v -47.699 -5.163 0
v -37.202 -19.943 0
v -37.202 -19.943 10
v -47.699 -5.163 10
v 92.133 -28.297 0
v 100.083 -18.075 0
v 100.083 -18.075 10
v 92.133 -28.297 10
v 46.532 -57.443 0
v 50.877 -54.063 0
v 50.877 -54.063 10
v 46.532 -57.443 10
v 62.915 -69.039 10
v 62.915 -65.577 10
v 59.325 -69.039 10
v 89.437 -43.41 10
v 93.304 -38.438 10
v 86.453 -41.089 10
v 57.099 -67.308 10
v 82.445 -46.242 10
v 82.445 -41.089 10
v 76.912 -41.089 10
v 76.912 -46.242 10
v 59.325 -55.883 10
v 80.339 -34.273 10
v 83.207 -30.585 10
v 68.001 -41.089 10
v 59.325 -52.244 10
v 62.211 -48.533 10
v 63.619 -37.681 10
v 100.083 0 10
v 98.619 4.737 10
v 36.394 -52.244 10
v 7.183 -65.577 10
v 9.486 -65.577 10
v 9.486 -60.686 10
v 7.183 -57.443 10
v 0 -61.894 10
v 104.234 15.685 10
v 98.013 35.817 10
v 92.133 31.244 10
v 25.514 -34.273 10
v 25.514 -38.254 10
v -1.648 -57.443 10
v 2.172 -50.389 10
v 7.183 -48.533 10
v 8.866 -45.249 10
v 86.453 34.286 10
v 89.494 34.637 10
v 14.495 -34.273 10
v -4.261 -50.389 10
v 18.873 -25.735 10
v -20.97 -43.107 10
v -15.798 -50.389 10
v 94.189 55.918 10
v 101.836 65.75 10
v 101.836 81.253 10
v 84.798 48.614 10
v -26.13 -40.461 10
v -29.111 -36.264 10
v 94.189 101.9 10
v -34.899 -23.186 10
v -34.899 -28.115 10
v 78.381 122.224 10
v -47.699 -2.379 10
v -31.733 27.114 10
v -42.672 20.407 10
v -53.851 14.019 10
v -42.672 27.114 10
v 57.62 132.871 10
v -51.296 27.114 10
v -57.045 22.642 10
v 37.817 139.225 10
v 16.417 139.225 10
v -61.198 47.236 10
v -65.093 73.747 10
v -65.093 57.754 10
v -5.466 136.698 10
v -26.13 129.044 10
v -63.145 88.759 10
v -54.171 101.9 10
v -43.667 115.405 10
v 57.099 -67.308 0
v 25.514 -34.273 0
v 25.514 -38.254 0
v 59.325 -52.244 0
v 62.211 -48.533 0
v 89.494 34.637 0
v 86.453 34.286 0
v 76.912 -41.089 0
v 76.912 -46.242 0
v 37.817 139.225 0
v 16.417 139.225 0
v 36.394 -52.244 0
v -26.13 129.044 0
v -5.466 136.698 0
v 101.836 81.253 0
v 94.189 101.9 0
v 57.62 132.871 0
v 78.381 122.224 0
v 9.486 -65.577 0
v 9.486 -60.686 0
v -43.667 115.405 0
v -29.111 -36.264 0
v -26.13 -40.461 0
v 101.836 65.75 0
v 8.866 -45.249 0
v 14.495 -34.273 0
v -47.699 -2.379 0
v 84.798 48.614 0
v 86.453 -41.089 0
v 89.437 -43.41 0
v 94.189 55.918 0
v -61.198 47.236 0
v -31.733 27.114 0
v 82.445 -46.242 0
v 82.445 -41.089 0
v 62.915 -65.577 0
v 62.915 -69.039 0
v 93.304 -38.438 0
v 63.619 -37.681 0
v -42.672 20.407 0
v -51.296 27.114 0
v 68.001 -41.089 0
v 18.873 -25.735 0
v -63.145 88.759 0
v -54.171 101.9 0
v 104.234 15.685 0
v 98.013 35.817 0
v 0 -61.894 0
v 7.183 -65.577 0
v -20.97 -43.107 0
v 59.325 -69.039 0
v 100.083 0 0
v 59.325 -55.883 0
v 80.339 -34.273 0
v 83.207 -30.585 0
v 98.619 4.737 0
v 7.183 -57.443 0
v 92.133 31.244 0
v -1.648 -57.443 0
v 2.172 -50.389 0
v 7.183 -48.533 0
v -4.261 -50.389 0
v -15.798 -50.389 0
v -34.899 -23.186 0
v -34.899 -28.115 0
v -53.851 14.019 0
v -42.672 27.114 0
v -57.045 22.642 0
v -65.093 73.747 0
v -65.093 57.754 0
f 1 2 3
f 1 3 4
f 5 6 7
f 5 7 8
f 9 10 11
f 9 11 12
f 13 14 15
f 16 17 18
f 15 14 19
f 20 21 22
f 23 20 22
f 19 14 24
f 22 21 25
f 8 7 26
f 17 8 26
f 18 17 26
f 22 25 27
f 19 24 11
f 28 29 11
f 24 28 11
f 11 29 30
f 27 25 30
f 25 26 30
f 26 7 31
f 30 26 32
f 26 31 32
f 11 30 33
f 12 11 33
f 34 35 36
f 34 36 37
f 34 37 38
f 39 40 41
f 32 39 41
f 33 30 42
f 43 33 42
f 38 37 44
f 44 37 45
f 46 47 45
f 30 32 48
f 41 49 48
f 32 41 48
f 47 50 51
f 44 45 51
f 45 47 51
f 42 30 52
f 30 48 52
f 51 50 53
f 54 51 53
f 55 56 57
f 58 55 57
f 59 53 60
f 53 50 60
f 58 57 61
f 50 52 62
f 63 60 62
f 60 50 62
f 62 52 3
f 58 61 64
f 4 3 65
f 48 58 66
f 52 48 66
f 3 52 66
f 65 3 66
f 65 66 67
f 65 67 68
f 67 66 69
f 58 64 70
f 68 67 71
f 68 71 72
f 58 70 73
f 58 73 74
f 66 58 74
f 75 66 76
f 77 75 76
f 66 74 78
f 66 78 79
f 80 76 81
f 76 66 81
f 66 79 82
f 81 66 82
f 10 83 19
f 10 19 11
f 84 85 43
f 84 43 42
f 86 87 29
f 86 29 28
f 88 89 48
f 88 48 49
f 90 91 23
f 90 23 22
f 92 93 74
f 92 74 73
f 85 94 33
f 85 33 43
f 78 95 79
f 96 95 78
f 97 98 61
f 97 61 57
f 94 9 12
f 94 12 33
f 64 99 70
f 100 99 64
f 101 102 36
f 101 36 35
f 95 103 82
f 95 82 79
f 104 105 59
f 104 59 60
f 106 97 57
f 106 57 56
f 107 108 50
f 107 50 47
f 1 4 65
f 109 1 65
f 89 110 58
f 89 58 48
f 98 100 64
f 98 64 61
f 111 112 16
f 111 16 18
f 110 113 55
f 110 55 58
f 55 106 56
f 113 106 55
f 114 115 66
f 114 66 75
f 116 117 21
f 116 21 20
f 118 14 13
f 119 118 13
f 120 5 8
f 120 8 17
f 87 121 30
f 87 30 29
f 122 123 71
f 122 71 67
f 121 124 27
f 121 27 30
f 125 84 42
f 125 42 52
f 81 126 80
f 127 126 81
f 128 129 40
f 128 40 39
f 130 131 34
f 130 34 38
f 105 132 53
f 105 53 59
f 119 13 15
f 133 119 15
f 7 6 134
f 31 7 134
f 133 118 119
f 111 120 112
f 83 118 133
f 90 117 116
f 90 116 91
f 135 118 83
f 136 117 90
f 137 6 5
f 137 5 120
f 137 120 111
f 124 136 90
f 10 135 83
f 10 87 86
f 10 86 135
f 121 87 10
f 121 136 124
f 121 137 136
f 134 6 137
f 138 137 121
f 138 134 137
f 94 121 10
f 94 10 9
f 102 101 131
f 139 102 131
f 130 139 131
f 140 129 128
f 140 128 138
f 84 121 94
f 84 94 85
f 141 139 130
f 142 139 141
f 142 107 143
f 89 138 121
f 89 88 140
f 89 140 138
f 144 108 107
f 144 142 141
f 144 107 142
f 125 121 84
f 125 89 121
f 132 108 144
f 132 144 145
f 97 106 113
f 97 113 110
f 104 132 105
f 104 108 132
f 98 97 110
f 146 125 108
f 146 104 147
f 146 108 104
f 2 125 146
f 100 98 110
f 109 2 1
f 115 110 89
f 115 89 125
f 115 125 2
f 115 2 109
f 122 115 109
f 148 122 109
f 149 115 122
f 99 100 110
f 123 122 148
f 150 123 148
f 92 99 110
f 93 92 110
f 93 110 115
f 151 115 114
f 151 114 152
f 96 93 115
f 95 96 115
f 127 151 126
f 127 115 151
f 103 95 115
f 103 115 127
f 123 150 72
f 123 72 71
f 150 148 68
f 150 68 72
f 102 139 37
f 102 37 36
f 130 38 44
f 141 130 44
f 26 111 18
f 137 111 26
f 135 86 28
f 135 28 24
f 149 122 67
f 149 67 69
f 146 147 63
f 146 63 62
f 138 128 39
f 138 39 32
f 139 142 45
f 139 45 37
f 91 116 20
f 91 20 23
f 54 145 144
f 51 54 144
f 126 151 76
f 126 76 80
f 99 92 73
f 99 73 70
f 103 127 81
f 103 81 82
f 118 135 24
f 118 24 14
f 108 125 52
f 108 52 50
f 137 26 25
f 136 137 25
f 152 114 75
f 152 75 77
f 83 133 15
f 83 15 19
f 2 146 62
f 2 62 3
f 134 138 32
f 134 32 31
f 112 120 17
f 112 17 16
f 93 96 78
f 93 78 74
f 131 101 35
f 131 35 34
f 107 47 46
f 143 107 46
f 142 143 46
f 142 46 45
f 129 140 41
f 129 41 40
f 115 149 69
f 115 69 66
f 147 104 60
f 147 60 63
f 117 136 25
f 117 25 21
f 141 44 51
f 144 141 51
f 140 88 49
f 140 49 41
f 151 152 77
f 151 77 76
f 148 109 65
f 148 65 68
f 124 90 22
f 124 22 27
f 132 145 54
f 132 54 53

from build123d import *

# Parameters (mm, degrees)
EXTRUDE_1_DEPTH = 10


with BuildPart() as part:
    # Эскиз1 → Бобышка-Вытянуть1 (new body)
    with BuildSketch(Plane.XY):
        Polygon((-53.85138596, 14.018578311), (-57.04541686, 22.64246174), (-51.296161241, 27.114105), (-42.672277811, 20.40664011), (-42.672277811, 27.114105), (-31.732721979, 27.114105), (-61.19765703, 47.236499669), (-65.092910636, 57.753684406), (-65.092910636, 73.746956137), (-63.145283833, 88.758901366), (-54.17078905, 101.900125869), (-43.667374626, 115.404515844), (-26.130435815, 129.044357141), (-5.466398977, 136.697704118), (16.417293835, 139.224589583), (37.817300864, 139.224589583), (57.620292443, 132.871030629), (78.381493292, 122.224436492), (94.189290443, 101.900125869), (101.836400486, 81.252928751), (101.836400486, 65.750320271), (94.189290443, 55.918321644), (84.798214398, 48.614151387), (86.452679963, 34.285913445), (89.49375242, 34.637062671), (92.132772709, 31.244036586), (98.012845465, 35.817426507), (104.233890809, 15.685456171), (98.619402154, 4.737022793), (100.083204907, 0), (100.083204907, -10.326628952), (100.083204907, -18.075202764), (92.132772709, -28.297187018), (93.303752164, -38.438269801), (89.436859181, -43.40998935), (86.452679963, -41.088961069), (83.206856787, -30.585128953), (80.338686983, -34.272775844), (82.444978452, -41.088961069), (82.444978452, -46.241720155), (76.912286554, -46.241720155), (76.912286554, -41.088961069), (68.000892867, -41.088961069), (63.619059508, -37.680868456), (62.211127726, -48.532944823), (59.324618186, -52.244171373), (59.324618186, -55.882780265), (62.915093617, -65.577063928), (62.915093617, -69.038718479), (59.324618186, -69.038718479), (57.099268832, -67.307891203), (50.877031559, -54.063475819), (46.532092284, -57.442873034), (36.394456911, -52.244171373), (25.513596442, -38.254493627), (25.513596442, -34.272775844), (18.873446088, -25.735439675), (14.495397156, -34.272775844), (8.866486546, -45.2493325), (7.182610552, -48.532944823), (2.172454709, -50.388558098), (7.182610552, -57.442873034), (9.485737931, -60.685683511), (9.485737931, -65.577063928), (7.182610552, -65.577063928), (0, -61.893734627), (-1.648467257, -57.442873034), (-4.261176492, -50.388558098), (-7.199449567, -50.388558098), (-12.097138316, -50.388558098), (-15.798417396, -50.388558098), (-20.970033483, -43.10690664), (-26.130435815, -40.460590099), (-29.111221424, -36.263634735), (-34.898905221, -28.114558035), (-34.898905221, -23.186194891), (-37.202499895, -19.942726459), (-47.699218285, -5.163314476), (-47.699218285, -2.378627093), align=None)
    extrude(amount=EXTRUDE_1_DEPTH)


solid = part.part
